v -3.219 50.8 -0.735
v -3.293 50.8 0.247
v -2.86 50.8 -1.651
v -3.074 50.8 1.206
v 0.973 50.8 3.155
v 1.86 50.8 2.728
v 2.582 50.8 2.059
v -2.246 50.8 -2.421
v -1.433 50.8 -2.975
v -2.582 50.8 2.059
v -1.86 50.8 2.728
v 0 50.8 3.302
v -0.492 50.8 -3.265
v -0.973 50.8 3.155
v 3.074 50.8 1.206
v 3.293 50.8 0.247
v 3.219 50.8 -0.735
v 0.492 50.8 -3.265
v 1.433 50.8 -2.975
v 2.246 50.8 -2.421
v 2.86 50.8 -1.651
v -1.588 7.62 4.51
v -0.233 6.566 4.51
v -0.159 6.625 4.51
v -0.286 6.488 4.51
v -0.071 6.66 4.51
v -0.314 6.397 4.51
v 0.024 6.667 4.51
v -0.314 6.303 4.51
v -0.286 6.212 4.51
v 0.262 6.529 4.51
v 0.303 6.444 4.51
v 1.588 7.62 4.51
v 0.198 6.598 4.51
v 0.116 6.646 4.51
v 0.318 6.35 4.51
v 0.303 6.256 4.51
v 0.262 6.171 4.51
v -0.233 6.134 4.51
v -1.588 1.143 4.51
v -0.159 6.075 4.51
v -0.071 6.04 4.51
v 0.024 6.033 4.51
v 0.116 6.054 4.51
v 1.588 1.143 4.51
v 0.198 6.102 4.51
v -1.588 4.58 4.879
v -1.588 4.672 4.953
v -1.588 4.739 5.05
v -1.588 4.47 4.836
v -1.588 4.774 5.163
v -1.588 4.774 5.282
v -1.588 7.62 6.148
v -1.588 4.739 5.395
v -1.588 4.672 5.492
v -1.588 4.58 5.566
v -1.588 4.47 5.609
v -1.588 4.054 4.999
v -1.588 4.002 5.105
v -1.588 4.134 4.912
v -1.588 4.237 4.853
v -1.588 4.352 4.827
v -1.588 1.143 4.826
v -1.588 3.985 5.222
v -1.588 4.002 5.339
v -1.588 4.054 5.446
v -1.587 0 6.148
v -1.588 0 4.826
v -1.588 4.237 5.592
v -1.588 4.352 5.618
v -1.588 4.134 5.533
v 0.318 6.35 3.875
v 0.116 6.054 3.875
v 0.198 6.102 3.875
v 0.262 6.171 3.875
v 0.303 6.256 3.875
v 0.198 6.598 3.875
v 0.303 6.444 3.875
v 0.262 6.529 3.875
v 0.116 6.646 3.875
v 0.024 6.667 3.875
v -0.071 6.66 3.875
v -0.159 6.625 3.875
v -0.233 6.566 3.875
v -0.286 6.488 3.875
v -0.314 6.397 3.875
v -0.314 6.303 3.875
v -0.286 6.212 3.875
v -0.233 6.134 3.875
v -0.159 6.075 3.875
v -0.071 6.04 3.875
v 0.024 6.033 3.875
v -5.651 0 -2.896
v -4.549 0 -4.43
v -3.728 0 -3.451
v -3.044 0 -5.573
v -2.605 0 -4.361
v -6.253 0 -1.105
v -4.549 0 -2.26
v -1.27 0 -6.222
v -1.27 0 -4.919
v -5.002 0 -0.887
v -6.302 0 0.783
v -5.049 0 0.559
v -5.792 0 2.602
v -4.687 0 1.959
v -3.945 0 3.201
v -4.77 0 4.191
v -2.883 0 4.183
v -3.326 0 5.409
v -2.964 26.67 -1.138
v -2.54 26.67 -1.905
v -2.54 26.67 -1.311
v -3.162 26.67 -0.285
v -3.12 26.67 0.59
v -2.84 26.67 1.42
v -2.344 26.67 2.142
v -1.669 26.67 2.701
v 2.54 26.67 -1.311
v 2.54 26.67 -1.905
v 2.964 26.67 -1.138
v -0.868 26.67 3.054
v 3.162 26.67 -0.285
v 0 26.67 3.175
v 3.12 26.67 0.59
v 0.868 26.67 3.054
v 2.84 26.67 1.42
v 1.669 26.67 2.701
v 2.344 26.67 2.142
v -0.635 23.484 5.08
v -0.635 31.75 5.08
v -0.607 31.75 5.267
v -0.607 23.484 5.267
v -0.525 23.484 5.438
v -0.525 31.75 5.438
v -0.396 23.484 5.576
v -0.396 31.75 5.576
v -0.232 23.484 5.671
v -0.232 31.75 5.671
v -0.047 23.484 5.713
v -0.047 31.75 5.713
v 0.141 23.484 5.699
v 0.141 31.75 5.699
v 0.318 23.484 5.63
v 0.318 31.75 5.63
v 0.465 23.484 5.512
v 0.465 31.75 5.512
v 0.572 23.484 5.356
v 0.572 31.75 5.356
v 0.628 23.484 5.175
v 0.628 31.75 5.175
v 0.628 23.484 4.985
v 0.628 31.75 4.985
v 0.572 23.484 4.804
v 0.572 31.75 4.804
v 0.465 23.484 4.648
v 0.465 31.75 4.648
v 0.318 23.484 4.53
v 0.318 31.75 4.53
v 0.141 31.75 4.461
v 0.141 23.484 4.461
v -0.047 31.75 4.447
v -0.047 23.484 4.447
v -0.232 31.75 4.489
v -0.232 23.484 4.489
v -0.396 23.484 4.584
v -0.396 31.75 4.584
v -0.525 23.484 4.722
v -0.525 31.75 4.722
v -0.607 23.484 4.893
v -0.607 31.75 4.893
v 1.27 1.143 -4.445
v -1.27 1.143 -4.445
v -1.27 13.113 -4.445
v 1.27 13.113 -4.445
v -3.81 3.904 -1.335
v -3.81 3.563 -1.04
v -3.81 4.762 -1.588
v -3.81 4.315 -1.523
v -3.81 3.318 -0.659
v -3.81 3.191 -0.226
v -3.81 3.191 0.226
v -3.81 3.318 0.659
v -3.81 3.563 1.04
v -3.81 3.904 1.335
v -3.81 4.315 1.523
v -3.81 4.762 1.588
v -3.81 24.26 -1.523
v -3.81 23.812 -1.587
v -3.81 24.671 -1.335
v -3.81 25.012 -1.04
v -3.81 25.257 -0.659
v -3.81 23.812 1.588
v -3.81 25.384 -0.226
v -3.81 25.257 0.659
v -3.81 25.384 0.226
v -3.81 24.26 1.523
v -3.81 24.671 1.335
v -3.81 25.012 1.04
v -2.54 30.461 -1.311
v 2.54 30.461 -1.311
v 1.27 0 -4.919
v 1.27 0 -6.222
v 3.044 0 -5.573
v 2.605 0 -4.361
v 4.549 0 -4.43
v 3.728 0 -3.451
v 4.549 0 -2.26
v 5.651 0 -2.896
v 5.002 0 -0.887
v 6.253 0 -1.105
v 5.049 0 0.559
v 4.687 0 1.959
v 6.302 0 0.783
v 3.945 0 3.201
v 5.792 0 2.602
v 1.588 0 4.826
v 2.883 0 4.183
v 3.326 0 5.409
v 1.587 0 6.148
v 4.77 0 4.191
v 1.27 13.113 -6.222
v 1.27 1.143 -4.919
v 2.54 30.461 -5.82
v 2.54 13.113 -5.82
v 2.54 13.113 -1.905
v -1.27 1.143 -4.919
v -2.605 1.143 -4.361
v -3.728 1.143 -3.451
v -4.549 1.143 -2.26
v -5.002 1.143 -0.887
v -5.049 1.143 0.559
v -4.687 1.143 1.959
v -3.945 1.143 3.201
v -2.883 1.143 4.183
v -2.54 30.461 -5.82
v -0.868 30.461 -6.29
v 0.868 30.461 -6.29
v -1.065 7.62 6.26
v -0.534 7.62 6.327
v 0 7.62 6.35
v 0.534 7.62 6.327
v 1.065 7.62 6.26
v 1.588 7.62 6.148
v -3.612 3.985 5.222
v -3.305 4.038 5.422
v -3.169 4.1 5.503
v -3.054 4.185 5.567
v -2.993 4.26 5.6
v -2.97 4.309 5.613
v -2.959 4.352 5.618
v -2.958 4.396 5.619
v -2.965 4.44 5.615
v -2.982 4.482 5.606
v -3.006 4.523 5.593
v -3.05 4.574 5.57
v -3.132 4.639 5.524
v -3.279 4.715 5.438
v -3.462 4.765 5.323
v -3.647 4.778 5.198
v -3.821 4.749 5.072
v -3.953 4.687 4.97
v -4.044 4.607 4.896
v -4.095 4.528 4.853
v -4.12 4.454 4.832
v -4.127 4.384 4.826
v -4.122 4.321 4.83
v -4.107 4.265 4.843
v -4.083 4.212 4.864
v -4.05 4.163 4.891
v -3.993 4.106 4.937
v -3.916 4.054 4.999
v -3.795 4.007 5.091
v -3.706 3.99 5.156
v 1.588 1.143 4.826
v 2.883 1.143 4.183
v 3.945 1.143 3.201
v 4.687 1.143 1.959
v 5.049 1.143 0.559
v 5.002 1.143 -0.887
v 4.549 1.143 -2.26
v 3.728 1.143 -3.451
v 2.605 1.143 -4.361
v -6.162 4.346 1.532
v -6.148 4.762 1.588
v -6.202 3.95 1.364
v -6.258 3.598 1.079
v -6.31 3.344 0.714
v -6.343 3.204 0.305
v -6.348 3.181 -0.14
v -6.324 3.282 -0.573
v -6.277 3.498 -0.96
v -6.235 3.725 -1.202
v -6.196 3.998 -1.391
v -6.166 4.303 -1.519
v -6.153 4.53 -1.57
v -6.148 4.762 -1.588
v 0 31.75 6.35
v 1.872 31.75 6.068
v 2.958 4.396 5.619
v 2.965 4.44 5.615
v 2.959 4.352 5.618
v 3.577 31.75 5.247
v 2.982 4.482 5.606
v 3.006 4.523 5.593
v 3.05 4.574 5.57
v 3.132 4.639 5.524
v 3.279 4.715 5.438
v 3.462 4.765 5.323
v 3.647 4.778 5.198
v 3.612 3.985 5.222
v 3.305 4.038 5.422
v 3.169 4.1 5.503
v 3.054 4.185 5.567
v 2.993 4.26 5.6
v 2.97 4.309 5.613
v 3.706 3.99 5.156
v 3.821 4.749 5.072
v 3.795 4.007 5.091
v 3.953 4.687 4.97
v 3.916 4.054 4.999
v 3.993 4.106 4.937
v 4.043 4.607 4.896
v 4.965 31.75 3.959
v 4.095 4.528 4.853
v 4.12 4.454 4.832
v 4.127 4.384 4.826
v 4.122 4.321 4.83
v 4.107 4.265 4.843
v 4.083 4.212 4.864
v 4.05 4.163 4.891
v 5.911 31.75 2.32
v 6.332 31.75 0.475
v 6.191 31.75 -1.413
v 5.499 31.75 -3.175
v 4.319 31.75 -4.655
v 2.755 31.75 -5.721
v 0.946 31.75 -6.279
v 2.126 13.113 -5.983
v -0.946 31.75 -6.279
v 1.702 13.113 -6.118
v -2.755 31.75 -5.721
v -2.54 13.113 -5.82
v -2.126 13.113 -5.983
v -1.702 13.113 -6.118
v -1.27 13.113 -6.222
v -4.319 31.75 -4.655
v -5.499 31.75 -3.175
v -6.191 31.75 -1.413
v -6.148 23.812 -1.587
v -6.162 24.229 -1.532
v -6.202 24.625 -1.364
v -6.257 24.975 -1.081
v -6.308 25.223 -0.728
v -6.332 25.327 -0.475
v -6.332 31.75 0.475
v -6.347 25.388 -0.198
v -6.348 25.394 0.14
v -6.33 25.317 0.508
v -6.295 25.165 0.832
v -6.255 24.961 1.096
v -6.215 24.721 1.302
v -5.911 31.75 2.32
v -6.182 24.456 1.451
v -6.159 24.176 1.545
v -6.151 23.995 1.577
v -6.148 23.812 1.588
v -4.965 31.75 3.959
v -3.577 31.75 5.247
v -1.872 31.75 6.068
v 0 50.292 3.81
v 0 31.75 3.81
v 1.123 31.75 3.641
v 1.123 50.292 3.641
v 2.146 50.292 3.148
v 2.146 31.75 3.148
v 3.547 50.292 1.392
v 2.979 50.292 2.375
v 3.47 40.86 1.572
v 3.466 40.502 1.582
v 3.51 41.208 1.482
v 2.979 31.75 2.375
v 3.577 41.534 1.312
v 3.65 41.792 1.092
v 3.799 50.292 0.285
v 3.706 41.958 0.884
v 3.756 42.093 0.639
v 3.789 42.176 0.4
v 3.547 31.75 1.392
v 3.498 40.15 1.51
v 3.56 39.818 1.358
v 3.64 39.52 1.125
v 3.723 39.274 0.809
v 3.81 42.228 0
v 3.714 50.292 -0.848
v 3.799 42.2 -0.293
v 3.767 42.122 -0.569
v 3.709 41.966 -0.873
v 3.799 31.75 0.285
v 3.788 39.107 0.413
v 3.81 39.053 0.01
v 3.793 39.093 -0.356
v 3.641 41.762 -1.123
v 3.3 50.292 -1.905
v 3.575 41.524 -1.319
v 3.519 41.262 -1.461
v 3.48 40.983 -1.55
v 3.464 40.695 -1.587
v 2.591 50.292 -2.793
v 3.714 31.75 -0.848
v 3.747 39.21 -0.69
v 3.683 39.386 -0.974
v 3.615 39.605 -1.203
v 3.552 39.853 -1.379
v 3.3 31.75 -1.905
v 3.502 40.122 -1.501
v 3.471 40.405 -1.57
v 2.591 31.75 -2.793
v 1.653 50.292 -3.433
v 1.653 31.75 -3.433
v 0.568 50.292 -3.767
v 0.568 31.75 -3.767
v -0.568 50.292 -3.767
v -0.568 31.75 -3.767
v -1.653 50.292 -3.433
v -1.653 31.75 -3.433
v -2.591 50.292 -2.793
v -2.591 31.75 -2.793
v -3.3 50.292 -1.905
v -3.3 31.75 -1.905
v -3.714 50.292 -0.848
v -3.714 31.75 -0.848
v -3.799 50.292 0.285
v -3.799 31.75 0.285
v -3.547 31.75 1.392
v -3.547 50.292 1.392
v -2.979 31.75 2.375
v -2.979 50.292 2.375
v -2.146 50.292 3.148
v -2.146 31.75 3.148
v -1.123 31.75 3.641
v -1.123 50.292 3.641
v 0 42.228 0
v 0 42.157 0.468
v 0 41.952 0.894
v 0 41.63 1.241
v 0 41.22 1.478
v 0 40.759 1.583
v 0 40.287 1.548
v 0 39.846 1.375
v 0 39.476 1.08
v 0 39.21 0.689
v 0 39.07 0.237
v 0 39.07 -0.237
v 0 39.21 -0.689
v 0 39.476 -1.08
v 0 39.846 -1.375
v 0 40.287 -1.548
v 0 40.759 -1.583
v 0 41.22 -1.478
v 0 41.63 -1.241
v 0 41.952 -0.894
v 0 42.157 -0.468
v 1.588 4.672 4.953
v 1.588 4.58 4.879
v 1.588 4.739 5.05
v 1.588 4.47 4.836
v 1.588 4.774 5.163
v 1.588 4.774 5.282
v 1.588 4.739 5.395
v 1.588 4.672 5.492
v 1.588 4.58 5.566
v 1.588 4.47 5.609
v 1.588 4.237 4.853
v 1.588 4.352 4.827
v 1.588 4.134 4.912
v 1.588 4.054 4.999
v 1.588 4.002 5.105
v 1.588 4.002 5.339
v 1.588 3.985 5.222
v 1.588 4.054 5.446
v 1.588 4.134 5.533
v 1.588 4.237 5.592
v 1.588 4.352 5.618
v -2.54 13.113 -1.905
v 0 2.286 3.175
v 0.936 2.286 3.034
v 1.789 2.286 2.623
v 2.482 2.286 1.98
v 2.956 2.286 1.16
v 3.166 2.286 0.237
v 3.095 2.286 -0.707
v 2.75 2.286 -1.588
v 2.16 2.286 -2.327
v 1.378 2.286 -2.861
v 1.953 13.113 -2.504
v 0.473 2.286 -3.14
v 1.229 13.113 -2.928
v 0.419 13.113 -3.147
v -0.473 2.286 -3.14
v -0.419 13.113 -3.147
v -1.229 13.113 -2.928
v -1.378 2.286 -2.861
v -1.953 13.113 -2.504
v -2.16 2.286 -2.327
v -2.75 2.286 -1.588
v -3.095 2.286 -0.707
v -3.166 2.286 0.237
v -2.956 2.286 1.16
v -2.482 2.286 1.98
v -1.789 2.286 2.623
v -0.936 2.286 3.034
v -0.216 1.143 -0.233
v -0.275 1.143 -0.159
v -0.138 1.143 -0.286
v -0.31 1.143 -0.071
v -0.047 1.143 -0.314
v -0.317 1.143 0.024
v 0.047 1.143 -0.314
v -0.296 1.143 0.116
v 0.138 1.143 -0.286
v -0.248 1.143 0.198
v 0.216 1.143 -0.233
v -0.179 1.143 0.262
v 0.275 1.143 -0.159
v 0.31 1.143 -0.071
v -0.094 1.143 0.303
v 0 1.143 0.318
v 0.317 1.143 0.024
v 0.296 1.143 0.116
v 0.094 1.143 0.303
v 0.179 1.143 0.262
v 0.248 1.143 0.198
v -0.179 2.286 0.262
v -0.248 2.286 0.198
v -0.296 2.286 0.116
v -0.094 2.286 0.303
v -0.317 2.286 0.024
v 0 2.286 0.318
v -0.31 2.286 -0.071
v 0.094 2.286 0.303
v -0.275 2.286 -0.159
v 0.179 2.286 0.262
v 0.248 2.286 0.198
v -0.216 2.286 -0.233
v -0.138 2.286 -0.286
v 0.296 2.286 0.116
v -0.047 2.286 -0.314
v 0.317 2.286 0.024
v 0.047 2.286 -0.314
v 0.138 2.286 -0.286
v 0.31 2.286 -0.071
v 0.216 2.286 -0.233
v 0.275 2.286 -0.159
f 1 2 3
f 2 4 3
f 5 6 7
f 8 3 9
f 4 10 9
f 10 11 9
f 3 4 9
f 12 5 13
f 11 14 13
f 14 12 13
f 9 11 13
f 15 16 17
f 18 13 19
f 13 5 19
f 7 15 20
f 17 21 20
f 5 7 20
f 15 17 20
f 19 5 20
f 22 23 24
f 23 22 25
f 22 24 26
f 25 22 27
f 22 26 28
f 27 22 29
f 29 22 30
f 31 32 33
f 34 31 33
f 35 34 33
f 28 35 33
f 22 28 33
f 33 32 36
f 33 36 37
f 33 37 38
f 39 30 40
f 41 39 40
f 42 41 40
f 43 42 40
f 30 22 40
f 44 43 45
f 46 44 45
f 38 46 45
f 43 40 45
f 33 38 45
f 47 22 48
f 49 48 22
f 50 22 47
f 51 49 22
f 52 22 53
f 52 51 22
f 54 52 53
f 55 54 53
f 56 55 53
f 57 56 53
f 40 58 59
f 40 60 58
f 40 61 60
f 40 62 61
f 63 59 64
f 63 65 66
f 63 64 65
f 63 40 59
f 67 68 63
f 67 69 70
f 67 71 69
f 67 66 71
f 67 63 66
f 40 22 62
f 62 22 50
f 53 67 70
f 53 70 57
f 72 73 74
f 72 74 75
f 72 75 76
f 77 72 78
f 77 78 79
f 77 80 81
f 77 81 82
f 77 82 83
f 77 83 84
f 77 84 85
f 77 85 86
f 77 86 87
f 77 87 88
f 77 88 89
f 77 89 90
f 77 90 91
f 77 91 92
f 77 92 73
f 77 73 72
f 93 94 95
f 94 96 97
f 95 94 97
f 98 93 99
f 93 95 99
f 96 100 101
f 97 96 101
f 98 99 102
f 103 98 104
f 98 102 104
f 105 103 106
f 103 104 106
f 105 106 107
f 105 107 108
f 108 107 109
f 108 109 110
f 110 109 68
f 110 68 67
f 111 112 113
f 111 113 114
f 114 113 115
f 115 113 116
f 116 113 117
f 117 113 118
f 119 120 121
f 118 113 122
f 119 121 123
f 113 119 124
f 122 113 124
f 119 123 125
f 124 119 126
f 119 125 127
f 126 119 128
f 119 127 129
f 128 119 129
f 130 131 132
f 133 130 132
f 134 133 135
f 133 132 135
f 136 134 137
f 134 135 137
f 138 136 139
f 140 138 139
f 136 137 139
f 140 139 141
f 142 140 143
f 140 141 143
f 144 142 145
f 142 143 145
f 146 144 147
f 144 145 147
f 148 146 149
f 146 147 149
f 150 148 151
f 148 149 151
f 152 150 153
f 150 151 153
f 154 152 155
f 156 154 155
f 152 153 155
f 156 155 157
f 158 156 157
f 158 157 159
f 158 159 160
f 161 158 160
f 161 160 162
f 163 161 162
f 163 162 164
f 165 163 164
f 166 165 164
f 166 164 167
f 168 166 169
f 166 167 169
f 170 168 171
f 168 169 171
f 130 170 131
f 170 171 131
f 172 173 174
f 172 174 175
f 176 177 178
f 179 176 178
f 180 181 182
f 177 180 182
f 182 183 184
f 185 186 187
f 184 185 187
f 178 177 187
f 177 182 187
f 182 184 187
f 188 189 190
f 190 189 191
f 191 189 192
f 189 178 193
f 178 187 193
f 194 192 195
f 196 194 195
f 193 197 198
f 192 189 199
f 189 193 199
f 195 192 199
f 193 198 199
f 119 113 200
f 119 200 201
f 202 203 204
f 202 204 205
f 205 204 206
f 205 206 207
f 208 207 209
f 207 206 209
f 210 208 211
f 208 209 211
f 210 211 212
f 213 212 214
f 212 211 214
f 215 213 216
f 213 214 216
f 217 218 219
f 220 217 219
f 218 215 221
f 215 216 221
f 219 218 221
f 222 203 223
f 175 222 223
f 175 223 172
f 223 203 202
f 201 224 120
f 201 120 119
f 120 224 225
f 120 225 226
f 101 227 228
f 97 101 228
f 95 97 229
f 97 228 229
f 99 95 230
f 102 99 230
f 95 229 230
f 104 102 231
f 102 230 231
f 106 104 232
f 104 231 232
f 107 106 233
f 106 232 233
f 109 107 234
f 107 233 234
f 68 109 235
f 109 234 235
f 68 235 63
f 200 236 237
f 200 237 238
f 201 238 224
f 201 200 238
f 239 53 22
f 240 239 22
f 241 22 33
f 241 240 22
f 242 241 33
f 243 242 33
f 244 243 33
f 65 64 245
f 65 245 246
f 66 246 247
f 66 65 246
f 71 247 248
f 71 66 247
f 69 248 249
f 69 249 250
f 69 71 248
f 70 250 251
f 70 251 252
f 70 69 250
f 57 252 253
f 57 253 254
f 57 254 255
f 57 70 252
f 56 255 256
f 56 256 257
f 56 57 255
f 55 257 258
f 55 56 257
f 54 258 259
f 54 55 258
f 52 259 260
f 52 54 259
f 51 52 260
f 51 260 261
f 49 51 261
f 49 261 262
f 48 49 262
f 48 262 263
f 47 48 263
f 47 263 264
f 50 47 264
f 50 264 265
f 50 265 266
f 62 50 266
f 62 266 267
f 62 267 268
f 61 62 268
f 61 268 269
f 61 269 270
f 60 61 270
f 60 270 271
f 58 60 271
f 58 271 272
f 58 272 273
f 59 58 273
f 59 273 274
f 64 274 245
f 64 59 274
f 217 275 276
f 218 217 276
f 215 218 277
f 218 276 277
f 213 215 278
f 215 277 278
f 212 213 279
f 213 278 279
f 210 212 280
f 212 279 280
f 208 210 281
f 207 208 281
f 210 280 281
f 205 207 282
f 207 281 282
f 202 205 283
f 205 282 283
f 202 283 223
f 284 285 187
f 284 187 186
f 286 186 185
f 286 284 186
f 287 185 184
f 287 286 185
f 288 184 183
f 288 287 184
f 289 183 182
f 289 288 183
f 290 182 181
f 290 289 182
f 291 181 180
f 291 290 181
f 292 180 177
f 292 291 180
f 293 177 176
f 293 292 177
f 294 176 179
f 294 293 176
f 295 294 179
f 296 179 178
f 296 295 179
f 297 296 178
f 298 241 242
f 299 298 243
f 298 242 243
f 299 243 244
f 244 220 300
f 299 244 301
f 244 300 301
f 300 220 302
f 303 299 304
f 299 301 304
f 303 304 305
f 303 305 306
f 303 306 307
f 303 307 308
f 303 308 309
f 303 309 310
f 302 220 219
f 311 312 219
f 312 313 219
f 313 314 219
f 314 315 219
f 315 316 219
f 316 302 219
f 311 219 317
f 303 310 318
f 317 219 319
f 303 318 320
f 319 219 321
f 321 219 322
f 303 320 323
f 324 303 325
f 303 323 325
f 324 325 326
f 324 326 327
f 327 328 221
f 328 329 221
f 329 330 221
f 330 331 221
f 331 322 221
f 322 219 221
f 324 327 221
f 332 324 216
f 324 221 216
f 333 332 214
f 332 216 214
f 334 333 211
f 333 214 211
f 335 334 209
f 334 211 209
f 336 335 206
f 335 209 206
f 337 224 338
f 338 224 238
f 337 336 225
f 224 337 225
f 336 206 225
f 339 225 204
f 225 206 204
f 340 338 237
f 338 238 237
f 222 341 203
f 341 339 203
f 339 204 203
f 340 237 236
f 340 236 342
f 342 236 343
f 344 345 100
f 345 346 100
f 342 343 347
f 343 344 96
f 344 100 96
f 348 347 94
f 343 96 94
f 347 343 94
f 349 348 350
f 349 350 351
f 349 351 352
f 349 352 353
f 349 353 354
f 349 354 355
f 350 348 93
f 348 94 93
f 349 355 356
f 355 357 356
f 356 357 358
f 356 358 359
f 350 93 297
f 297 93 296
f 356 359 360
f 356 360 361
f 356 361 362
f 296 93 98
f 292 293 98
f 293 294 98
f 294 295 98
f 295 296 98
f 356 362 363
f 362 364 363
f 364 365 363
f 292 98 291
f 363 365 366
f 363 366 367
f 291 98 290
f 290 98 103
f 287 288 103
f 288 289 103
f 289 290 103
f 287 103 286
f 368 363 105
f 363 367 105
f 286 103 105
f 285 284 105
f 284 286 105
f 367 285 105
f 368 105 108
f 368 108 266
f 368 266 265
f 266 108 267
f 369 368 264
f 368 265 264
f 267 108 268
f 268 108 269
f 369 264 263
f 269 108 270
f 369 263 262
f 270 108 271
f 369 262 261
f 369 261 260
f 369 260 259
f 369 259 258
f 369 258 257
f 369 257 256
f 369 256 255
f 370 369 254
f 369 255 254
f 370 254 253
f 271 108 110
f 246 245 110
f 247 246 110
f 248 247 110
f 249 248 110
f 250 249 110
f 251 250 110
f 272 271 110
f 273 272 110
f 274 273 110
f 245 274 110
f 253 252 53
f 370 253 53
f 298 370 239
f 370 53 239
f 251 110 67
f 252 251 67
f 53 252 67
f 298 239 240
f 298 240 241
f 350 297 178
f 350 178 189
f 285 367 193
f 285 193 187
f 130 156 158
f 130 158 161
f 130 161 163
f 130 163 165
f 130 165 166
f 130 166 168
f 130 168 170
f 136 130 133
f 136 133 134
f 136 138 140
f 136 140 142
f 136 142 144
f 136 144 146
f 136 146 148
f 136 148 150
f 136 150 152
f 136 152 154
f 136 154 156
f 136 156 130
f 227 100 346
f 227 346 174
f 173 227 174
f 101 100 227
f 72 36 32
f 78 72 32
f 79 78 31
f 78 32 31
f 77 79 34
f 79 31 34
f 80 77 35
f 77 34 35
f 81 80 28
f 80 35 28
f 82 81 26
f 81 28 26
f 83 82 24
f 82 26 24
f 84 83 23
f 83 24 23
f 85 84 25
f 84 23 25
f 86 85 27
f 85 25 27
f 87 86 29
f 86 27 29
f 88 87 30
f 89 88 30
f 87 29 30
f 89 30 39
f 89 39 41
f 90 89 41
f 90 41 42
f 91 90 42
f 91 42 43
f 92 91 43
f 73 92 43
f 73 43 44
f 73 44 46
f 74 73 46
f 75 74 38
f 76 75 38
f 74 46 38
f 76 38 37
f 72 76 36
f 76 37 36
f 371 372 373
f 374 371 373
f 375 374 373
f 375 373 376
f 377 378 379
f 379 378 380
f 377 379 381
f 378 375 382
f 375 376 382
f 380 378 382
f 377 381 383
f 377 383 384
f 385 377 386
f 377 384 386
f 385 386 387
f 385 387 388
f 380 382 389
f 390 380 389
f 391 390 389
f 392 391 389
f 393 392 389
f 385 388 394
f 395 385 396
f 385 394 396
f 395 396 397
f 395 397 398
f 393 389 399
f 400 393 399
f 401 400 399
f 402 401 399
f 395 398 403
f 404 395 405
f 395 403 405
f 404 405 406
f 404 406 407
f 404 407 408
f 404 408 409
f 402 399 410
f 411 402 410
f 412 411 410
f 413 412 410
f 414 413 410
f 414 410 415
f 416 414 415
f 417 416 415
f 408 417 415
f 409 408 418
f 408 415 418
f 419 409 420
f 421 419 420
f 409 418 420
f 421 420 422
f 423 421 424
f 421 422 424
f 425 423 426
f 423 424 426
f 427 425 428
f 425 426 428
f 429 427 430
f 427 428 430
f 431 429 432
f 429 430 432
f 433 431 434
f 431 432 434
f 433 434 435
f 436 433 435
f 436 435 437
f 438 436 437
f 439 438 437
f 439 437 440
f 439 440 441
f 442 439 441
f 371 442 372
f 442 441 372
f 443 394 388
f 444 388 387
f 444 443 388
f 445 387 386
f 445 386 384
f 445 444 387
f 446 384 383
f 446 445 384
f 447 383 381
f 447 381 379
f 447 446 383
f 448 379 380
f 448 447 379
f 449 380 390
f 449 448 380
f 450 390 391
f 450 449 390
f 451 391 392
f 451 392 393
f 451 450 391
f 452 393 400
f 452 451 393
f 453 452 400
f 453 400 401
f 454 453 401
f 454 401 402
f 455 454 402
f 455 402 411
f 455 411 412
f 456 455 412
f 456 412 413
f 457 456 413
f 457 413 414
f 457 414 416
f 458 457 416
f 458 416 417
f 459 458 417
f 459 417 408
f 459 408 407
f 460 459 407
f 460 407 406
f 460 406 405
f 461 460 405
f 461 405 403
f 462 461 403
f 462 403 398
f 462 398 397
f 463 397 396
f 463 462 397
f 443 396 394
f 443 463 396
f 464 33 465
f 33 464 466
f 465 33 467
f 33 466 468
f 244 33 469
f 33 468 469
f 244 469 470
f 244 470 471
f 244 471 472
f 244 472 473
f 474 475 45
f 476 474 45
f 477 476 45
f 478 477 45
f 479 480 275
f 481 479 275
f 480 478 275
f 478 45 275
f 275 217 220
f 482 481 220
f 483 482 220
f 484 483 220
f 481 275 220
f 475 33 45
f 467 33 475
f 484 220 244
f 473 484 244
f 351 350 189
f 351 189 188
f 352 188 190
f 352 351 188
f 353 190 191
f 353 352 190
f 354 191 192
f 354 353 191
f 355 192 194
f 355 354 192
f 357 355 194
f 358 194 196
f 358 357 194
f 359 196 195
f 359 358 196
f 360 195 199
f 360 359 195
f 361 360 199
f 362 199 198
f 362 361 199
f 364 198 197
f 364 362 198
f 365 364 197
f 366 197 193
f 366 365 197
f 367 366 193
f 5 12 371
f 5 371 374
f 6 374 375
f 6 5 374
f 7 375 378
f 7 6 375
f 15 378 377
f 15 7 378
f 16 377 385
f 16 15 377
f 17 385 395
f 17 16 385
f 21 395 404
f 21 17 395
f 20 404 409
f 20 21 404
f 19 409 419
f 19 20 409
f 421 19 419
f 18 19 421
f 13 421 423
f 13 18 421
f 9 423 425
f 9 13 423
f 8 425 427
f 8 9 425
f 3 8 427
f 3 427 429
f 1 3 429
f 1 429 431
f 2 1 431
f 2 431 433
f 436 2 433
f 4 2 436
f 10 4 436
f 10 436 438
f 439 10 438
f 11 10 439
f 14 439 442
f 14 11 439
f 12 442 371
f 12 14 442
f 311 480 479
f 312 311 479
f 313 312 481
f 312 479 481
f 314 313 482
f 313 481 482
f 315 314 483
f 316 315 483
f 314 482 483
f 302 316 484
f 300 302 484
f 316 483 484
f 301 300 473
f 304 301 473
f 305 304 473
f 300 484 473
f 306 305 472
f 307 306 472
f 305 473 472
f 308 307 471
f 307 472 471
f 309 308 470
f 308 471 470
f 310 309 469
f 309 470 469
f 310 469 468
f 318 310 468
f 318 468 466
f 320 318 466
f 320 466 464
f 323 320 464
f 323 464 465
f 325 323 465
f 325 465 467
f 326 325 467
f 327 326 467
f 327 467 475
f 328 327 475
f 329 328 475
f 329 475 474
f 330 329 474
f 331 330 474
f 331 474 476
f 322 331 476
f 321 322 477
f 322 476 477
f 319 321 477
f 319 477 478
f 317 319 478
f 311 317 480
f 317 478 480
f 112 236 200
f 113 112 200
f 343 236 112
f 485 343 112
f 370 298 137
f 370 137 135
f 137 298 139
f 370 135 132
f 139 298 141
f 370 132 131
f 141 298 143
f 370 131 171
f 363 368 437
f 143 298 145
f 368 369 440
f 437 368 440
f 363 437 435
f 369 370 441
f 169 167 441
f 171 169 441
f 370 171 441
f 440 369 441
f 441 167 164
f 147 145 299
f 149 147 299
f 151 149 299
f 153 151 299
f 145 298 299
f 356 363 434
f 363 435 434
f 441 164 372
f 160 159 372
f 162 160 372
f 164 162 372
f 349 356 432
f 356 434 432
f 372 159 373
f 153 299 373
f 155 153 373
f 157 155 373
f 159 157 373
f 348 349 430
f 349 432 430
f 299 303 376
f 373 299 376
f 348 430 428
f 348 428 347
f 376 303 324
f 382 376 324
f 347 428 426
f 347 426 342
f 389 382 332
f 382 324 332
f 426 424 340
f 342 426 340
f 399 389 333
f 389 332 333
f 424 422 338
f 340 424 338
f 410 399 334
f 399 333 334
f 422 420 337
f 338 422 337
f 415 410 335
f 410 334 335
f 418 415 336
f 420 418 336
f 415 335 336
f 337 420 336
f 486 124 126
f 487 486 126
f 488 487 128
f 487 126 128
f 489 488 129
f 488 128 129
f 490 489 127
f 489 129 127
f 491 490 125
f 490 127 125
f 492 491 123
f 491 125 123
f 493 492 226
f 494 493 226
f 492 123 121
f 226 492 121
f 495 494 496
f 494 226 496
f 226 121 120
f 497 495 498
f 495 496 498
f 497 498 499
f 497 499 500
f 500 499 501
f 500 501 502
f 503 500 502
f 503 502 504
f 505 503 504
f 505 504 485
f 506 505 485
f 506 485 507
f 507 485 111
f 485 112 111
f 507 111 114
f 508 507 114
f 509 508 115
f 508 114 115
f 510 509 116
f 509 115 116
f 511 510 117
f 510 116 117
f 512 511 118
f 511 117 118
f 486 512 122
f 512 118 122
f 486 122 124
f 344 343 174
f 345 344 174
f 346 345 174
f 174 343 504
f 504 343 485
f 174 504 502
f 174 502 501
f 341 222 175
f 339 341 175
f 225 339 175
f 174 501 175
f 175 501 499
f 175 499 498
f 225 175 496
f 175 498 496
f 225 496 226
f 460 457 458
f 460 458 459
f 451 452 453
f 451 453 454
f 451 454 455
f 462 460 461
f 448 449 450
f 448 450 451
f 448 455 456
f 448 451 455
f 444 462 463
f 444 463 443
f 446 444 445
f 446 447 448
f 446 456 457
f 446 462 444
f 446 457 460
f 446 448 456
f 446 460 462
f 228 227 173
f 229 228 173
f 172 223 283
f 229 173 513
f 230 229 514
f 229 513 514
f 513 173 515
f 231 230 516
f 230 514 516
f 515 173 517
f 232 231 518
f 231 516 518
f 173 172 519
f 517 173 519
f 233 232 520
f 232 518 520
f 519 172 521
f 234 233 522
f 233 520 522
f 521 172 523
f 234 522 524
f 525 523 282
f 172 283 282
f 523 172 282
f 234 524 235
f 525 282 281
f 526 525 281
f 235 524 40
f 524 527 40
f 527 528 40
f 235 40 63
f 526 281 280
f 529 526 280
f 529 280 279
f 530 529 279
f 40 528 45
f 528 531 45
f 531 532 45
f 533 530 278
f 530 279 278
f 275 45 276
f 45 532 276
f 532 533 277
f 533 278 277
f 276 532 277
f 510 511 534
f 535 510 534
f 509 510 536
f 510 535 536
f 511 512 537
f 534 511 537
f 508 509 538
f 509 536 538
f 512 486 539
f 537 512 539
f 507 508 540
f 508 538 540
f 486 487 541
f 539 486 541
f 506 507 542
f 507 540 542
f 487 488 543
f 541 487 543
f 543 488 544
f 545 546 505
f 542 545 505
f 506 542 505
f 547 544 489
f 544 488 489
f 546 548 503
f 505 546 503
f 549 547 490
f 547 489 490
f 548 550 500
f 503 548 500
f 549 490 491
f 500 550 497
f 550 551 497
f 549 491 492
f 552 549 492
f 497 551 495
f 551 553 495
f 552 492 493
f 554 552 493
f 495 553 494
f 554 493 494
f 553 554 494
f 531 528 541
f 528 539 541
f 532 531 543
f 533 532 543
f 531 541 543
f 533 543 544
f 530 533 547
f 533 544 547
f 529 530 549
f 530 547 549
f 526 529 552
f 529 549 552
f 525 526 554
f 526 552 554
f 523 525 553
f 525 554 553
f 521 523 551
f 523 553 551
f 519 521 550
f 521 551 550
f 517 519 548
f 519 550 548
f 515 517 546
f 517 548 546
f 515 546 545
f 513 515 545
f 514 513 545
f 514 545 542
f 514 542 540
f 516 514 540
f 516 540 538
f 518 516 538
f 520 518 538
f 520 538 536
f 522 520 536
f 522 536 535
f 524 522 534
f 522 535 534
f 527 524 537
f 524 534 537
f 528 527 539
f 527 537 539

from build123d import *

# Parameters (mm, degrees)
F2_R           = 1.5875
F3_DEPTH       = 25.4
F6_DEPTH       = 2.54
F8_W           = 5.08
F8_H           = 12.7
F9_DEPTH       = 17.3480194062
F10_W          = 3.175
F10_H          = 3.175
F11_DEPTH      = 7.62
F12_R          = 0.396875
F13_DEPTH      = 25.4
F13_DEPTH_BACK = 25.4
F14_R          = 0.3175
F15_DEPTH      = 0.635
F16_R          = 0.635
F17_DEPTH      = 8.2660857588
F18_W          = 2.54
F18_H          = 3.8718514089
F19_DEPTH      = 25.4
F20_SIZE       = 0.508


with BuildPart() as f1:
    # F0 (on Right) → F1 (revolve)
    with BuildSketch(Plane.YZ):
        Polygon((26.67, 3.175), (26.67, 0), (50.8, 0), (50.8, 3.81), (31.75, 3.81), (31.75, 6.35), (0, 6.35), (0, 5.08), (1.143, 5.08), (1.143, 0.3175), (2.286, 0.3175), (2.286, 3.175), align=None)
    revolve(axis=Axis((0, 38.735, 0), (0, 1, 0)))

    # F2 (on Right) → F3 (cut)
    with BuildSketch(Plane.YZ):
        with Locations((40.64, 0)):
            Circle(F2_R)
    extrude(amount=F3_DEPTH, mode=Mode.SUBTRACT)

    # F5 (on offset) → F6 (cut)
    with BuildSketch(Plane.YZ.offset(-6.35)):
        with BuildLine():
            Line((4.7625, -1.5875), (23.8125, -1.5875))
            ThreePointArc((23.8125, -1.5875), (25.4, 0), (23.8125, 1.5875))
            Line((23.8125, 1.5875), (4.7625, 1.5875))
            ThreePointArc((4.7625, 1.5875), (3.175, 0), (4.7625, -1.5875))
        make_face()
    extrude(amount=F6_DEPTH, mode=Mode.SUBTRACT)

    # F8 (on offset) → F9 (cut)
    with BuildSketch(Plane.XZ.offset(-13.112607412)):
        with Locations((0, -7.6607518819)):
            Rectangle(F8_W, F8_H)
    extrude(amount=-F9_DEPTH, mode=Mode.SUBTRACT)

    # F10 (on face) → F11 (cut)
    with BuildSketch(Plane.XZ):
        with Locations((0, 6.0977916799)):
            Rectangle(F10_W, F10_H)
    extrude(amount=-F11_DEPTH, mode=Mode.SUBTRACT)

    # F12 (on face) → F13 (cut, two sides)
    with BuildSketch(Plane(origin=(1.5875, 0, 0), x_dir=(0, -1, 0), z_dir=(-1, 0, 0))) as f13_sk:
        with Locations((-4.3815, 5.2224572188)):
            Circle(F12_R)
    extrude(amount=-F13_DEPTH, mode=Mode.SUBTRACT)
    extrude(f13_sk.sketch, amount=F13_DEPTH_BACK, mode=Mode.SUBTRACT)

    # F14 (on face) → F15 (cut)
    with BuildSketch(Plane.XY.offset(4.5102916799)):
        with Locations((0, 6.35)):
            Circle(F14_R)
    extrude(amount=-F15_DEPTH, mode=Mode.SUBTRACT)

    # F16 (on face) → F17 (cut)
    with BuildSketch(Plane(origin=(0, 31.75, 0), x_dir=(-1, 0, 0), z_dir=(0, 1, 0))):
        with Locations((0, 5.08)):
            Circle(F16_R)
    extrude(amount=-F17_DEPTH, mode=Mode.SUBTRACT)

    # F18 (on face) → F19 (cut)
    with BuildSketch(Plane.XZ):
        with Locations((0, -6.3809257044)):
            Rectangle(F18_W, F18_H)
    extrude(amount=-F19_DEPTH, mode=Mode.SUBTRACT)

    # F20
    f20_edges = [f1.edges().sort_by_distance(p)[0] for p in [
        (0, 50.8, -3.81),
    ]]
    chamfer(f20_edges, length=F20_SIZE)


solid = f1.part
